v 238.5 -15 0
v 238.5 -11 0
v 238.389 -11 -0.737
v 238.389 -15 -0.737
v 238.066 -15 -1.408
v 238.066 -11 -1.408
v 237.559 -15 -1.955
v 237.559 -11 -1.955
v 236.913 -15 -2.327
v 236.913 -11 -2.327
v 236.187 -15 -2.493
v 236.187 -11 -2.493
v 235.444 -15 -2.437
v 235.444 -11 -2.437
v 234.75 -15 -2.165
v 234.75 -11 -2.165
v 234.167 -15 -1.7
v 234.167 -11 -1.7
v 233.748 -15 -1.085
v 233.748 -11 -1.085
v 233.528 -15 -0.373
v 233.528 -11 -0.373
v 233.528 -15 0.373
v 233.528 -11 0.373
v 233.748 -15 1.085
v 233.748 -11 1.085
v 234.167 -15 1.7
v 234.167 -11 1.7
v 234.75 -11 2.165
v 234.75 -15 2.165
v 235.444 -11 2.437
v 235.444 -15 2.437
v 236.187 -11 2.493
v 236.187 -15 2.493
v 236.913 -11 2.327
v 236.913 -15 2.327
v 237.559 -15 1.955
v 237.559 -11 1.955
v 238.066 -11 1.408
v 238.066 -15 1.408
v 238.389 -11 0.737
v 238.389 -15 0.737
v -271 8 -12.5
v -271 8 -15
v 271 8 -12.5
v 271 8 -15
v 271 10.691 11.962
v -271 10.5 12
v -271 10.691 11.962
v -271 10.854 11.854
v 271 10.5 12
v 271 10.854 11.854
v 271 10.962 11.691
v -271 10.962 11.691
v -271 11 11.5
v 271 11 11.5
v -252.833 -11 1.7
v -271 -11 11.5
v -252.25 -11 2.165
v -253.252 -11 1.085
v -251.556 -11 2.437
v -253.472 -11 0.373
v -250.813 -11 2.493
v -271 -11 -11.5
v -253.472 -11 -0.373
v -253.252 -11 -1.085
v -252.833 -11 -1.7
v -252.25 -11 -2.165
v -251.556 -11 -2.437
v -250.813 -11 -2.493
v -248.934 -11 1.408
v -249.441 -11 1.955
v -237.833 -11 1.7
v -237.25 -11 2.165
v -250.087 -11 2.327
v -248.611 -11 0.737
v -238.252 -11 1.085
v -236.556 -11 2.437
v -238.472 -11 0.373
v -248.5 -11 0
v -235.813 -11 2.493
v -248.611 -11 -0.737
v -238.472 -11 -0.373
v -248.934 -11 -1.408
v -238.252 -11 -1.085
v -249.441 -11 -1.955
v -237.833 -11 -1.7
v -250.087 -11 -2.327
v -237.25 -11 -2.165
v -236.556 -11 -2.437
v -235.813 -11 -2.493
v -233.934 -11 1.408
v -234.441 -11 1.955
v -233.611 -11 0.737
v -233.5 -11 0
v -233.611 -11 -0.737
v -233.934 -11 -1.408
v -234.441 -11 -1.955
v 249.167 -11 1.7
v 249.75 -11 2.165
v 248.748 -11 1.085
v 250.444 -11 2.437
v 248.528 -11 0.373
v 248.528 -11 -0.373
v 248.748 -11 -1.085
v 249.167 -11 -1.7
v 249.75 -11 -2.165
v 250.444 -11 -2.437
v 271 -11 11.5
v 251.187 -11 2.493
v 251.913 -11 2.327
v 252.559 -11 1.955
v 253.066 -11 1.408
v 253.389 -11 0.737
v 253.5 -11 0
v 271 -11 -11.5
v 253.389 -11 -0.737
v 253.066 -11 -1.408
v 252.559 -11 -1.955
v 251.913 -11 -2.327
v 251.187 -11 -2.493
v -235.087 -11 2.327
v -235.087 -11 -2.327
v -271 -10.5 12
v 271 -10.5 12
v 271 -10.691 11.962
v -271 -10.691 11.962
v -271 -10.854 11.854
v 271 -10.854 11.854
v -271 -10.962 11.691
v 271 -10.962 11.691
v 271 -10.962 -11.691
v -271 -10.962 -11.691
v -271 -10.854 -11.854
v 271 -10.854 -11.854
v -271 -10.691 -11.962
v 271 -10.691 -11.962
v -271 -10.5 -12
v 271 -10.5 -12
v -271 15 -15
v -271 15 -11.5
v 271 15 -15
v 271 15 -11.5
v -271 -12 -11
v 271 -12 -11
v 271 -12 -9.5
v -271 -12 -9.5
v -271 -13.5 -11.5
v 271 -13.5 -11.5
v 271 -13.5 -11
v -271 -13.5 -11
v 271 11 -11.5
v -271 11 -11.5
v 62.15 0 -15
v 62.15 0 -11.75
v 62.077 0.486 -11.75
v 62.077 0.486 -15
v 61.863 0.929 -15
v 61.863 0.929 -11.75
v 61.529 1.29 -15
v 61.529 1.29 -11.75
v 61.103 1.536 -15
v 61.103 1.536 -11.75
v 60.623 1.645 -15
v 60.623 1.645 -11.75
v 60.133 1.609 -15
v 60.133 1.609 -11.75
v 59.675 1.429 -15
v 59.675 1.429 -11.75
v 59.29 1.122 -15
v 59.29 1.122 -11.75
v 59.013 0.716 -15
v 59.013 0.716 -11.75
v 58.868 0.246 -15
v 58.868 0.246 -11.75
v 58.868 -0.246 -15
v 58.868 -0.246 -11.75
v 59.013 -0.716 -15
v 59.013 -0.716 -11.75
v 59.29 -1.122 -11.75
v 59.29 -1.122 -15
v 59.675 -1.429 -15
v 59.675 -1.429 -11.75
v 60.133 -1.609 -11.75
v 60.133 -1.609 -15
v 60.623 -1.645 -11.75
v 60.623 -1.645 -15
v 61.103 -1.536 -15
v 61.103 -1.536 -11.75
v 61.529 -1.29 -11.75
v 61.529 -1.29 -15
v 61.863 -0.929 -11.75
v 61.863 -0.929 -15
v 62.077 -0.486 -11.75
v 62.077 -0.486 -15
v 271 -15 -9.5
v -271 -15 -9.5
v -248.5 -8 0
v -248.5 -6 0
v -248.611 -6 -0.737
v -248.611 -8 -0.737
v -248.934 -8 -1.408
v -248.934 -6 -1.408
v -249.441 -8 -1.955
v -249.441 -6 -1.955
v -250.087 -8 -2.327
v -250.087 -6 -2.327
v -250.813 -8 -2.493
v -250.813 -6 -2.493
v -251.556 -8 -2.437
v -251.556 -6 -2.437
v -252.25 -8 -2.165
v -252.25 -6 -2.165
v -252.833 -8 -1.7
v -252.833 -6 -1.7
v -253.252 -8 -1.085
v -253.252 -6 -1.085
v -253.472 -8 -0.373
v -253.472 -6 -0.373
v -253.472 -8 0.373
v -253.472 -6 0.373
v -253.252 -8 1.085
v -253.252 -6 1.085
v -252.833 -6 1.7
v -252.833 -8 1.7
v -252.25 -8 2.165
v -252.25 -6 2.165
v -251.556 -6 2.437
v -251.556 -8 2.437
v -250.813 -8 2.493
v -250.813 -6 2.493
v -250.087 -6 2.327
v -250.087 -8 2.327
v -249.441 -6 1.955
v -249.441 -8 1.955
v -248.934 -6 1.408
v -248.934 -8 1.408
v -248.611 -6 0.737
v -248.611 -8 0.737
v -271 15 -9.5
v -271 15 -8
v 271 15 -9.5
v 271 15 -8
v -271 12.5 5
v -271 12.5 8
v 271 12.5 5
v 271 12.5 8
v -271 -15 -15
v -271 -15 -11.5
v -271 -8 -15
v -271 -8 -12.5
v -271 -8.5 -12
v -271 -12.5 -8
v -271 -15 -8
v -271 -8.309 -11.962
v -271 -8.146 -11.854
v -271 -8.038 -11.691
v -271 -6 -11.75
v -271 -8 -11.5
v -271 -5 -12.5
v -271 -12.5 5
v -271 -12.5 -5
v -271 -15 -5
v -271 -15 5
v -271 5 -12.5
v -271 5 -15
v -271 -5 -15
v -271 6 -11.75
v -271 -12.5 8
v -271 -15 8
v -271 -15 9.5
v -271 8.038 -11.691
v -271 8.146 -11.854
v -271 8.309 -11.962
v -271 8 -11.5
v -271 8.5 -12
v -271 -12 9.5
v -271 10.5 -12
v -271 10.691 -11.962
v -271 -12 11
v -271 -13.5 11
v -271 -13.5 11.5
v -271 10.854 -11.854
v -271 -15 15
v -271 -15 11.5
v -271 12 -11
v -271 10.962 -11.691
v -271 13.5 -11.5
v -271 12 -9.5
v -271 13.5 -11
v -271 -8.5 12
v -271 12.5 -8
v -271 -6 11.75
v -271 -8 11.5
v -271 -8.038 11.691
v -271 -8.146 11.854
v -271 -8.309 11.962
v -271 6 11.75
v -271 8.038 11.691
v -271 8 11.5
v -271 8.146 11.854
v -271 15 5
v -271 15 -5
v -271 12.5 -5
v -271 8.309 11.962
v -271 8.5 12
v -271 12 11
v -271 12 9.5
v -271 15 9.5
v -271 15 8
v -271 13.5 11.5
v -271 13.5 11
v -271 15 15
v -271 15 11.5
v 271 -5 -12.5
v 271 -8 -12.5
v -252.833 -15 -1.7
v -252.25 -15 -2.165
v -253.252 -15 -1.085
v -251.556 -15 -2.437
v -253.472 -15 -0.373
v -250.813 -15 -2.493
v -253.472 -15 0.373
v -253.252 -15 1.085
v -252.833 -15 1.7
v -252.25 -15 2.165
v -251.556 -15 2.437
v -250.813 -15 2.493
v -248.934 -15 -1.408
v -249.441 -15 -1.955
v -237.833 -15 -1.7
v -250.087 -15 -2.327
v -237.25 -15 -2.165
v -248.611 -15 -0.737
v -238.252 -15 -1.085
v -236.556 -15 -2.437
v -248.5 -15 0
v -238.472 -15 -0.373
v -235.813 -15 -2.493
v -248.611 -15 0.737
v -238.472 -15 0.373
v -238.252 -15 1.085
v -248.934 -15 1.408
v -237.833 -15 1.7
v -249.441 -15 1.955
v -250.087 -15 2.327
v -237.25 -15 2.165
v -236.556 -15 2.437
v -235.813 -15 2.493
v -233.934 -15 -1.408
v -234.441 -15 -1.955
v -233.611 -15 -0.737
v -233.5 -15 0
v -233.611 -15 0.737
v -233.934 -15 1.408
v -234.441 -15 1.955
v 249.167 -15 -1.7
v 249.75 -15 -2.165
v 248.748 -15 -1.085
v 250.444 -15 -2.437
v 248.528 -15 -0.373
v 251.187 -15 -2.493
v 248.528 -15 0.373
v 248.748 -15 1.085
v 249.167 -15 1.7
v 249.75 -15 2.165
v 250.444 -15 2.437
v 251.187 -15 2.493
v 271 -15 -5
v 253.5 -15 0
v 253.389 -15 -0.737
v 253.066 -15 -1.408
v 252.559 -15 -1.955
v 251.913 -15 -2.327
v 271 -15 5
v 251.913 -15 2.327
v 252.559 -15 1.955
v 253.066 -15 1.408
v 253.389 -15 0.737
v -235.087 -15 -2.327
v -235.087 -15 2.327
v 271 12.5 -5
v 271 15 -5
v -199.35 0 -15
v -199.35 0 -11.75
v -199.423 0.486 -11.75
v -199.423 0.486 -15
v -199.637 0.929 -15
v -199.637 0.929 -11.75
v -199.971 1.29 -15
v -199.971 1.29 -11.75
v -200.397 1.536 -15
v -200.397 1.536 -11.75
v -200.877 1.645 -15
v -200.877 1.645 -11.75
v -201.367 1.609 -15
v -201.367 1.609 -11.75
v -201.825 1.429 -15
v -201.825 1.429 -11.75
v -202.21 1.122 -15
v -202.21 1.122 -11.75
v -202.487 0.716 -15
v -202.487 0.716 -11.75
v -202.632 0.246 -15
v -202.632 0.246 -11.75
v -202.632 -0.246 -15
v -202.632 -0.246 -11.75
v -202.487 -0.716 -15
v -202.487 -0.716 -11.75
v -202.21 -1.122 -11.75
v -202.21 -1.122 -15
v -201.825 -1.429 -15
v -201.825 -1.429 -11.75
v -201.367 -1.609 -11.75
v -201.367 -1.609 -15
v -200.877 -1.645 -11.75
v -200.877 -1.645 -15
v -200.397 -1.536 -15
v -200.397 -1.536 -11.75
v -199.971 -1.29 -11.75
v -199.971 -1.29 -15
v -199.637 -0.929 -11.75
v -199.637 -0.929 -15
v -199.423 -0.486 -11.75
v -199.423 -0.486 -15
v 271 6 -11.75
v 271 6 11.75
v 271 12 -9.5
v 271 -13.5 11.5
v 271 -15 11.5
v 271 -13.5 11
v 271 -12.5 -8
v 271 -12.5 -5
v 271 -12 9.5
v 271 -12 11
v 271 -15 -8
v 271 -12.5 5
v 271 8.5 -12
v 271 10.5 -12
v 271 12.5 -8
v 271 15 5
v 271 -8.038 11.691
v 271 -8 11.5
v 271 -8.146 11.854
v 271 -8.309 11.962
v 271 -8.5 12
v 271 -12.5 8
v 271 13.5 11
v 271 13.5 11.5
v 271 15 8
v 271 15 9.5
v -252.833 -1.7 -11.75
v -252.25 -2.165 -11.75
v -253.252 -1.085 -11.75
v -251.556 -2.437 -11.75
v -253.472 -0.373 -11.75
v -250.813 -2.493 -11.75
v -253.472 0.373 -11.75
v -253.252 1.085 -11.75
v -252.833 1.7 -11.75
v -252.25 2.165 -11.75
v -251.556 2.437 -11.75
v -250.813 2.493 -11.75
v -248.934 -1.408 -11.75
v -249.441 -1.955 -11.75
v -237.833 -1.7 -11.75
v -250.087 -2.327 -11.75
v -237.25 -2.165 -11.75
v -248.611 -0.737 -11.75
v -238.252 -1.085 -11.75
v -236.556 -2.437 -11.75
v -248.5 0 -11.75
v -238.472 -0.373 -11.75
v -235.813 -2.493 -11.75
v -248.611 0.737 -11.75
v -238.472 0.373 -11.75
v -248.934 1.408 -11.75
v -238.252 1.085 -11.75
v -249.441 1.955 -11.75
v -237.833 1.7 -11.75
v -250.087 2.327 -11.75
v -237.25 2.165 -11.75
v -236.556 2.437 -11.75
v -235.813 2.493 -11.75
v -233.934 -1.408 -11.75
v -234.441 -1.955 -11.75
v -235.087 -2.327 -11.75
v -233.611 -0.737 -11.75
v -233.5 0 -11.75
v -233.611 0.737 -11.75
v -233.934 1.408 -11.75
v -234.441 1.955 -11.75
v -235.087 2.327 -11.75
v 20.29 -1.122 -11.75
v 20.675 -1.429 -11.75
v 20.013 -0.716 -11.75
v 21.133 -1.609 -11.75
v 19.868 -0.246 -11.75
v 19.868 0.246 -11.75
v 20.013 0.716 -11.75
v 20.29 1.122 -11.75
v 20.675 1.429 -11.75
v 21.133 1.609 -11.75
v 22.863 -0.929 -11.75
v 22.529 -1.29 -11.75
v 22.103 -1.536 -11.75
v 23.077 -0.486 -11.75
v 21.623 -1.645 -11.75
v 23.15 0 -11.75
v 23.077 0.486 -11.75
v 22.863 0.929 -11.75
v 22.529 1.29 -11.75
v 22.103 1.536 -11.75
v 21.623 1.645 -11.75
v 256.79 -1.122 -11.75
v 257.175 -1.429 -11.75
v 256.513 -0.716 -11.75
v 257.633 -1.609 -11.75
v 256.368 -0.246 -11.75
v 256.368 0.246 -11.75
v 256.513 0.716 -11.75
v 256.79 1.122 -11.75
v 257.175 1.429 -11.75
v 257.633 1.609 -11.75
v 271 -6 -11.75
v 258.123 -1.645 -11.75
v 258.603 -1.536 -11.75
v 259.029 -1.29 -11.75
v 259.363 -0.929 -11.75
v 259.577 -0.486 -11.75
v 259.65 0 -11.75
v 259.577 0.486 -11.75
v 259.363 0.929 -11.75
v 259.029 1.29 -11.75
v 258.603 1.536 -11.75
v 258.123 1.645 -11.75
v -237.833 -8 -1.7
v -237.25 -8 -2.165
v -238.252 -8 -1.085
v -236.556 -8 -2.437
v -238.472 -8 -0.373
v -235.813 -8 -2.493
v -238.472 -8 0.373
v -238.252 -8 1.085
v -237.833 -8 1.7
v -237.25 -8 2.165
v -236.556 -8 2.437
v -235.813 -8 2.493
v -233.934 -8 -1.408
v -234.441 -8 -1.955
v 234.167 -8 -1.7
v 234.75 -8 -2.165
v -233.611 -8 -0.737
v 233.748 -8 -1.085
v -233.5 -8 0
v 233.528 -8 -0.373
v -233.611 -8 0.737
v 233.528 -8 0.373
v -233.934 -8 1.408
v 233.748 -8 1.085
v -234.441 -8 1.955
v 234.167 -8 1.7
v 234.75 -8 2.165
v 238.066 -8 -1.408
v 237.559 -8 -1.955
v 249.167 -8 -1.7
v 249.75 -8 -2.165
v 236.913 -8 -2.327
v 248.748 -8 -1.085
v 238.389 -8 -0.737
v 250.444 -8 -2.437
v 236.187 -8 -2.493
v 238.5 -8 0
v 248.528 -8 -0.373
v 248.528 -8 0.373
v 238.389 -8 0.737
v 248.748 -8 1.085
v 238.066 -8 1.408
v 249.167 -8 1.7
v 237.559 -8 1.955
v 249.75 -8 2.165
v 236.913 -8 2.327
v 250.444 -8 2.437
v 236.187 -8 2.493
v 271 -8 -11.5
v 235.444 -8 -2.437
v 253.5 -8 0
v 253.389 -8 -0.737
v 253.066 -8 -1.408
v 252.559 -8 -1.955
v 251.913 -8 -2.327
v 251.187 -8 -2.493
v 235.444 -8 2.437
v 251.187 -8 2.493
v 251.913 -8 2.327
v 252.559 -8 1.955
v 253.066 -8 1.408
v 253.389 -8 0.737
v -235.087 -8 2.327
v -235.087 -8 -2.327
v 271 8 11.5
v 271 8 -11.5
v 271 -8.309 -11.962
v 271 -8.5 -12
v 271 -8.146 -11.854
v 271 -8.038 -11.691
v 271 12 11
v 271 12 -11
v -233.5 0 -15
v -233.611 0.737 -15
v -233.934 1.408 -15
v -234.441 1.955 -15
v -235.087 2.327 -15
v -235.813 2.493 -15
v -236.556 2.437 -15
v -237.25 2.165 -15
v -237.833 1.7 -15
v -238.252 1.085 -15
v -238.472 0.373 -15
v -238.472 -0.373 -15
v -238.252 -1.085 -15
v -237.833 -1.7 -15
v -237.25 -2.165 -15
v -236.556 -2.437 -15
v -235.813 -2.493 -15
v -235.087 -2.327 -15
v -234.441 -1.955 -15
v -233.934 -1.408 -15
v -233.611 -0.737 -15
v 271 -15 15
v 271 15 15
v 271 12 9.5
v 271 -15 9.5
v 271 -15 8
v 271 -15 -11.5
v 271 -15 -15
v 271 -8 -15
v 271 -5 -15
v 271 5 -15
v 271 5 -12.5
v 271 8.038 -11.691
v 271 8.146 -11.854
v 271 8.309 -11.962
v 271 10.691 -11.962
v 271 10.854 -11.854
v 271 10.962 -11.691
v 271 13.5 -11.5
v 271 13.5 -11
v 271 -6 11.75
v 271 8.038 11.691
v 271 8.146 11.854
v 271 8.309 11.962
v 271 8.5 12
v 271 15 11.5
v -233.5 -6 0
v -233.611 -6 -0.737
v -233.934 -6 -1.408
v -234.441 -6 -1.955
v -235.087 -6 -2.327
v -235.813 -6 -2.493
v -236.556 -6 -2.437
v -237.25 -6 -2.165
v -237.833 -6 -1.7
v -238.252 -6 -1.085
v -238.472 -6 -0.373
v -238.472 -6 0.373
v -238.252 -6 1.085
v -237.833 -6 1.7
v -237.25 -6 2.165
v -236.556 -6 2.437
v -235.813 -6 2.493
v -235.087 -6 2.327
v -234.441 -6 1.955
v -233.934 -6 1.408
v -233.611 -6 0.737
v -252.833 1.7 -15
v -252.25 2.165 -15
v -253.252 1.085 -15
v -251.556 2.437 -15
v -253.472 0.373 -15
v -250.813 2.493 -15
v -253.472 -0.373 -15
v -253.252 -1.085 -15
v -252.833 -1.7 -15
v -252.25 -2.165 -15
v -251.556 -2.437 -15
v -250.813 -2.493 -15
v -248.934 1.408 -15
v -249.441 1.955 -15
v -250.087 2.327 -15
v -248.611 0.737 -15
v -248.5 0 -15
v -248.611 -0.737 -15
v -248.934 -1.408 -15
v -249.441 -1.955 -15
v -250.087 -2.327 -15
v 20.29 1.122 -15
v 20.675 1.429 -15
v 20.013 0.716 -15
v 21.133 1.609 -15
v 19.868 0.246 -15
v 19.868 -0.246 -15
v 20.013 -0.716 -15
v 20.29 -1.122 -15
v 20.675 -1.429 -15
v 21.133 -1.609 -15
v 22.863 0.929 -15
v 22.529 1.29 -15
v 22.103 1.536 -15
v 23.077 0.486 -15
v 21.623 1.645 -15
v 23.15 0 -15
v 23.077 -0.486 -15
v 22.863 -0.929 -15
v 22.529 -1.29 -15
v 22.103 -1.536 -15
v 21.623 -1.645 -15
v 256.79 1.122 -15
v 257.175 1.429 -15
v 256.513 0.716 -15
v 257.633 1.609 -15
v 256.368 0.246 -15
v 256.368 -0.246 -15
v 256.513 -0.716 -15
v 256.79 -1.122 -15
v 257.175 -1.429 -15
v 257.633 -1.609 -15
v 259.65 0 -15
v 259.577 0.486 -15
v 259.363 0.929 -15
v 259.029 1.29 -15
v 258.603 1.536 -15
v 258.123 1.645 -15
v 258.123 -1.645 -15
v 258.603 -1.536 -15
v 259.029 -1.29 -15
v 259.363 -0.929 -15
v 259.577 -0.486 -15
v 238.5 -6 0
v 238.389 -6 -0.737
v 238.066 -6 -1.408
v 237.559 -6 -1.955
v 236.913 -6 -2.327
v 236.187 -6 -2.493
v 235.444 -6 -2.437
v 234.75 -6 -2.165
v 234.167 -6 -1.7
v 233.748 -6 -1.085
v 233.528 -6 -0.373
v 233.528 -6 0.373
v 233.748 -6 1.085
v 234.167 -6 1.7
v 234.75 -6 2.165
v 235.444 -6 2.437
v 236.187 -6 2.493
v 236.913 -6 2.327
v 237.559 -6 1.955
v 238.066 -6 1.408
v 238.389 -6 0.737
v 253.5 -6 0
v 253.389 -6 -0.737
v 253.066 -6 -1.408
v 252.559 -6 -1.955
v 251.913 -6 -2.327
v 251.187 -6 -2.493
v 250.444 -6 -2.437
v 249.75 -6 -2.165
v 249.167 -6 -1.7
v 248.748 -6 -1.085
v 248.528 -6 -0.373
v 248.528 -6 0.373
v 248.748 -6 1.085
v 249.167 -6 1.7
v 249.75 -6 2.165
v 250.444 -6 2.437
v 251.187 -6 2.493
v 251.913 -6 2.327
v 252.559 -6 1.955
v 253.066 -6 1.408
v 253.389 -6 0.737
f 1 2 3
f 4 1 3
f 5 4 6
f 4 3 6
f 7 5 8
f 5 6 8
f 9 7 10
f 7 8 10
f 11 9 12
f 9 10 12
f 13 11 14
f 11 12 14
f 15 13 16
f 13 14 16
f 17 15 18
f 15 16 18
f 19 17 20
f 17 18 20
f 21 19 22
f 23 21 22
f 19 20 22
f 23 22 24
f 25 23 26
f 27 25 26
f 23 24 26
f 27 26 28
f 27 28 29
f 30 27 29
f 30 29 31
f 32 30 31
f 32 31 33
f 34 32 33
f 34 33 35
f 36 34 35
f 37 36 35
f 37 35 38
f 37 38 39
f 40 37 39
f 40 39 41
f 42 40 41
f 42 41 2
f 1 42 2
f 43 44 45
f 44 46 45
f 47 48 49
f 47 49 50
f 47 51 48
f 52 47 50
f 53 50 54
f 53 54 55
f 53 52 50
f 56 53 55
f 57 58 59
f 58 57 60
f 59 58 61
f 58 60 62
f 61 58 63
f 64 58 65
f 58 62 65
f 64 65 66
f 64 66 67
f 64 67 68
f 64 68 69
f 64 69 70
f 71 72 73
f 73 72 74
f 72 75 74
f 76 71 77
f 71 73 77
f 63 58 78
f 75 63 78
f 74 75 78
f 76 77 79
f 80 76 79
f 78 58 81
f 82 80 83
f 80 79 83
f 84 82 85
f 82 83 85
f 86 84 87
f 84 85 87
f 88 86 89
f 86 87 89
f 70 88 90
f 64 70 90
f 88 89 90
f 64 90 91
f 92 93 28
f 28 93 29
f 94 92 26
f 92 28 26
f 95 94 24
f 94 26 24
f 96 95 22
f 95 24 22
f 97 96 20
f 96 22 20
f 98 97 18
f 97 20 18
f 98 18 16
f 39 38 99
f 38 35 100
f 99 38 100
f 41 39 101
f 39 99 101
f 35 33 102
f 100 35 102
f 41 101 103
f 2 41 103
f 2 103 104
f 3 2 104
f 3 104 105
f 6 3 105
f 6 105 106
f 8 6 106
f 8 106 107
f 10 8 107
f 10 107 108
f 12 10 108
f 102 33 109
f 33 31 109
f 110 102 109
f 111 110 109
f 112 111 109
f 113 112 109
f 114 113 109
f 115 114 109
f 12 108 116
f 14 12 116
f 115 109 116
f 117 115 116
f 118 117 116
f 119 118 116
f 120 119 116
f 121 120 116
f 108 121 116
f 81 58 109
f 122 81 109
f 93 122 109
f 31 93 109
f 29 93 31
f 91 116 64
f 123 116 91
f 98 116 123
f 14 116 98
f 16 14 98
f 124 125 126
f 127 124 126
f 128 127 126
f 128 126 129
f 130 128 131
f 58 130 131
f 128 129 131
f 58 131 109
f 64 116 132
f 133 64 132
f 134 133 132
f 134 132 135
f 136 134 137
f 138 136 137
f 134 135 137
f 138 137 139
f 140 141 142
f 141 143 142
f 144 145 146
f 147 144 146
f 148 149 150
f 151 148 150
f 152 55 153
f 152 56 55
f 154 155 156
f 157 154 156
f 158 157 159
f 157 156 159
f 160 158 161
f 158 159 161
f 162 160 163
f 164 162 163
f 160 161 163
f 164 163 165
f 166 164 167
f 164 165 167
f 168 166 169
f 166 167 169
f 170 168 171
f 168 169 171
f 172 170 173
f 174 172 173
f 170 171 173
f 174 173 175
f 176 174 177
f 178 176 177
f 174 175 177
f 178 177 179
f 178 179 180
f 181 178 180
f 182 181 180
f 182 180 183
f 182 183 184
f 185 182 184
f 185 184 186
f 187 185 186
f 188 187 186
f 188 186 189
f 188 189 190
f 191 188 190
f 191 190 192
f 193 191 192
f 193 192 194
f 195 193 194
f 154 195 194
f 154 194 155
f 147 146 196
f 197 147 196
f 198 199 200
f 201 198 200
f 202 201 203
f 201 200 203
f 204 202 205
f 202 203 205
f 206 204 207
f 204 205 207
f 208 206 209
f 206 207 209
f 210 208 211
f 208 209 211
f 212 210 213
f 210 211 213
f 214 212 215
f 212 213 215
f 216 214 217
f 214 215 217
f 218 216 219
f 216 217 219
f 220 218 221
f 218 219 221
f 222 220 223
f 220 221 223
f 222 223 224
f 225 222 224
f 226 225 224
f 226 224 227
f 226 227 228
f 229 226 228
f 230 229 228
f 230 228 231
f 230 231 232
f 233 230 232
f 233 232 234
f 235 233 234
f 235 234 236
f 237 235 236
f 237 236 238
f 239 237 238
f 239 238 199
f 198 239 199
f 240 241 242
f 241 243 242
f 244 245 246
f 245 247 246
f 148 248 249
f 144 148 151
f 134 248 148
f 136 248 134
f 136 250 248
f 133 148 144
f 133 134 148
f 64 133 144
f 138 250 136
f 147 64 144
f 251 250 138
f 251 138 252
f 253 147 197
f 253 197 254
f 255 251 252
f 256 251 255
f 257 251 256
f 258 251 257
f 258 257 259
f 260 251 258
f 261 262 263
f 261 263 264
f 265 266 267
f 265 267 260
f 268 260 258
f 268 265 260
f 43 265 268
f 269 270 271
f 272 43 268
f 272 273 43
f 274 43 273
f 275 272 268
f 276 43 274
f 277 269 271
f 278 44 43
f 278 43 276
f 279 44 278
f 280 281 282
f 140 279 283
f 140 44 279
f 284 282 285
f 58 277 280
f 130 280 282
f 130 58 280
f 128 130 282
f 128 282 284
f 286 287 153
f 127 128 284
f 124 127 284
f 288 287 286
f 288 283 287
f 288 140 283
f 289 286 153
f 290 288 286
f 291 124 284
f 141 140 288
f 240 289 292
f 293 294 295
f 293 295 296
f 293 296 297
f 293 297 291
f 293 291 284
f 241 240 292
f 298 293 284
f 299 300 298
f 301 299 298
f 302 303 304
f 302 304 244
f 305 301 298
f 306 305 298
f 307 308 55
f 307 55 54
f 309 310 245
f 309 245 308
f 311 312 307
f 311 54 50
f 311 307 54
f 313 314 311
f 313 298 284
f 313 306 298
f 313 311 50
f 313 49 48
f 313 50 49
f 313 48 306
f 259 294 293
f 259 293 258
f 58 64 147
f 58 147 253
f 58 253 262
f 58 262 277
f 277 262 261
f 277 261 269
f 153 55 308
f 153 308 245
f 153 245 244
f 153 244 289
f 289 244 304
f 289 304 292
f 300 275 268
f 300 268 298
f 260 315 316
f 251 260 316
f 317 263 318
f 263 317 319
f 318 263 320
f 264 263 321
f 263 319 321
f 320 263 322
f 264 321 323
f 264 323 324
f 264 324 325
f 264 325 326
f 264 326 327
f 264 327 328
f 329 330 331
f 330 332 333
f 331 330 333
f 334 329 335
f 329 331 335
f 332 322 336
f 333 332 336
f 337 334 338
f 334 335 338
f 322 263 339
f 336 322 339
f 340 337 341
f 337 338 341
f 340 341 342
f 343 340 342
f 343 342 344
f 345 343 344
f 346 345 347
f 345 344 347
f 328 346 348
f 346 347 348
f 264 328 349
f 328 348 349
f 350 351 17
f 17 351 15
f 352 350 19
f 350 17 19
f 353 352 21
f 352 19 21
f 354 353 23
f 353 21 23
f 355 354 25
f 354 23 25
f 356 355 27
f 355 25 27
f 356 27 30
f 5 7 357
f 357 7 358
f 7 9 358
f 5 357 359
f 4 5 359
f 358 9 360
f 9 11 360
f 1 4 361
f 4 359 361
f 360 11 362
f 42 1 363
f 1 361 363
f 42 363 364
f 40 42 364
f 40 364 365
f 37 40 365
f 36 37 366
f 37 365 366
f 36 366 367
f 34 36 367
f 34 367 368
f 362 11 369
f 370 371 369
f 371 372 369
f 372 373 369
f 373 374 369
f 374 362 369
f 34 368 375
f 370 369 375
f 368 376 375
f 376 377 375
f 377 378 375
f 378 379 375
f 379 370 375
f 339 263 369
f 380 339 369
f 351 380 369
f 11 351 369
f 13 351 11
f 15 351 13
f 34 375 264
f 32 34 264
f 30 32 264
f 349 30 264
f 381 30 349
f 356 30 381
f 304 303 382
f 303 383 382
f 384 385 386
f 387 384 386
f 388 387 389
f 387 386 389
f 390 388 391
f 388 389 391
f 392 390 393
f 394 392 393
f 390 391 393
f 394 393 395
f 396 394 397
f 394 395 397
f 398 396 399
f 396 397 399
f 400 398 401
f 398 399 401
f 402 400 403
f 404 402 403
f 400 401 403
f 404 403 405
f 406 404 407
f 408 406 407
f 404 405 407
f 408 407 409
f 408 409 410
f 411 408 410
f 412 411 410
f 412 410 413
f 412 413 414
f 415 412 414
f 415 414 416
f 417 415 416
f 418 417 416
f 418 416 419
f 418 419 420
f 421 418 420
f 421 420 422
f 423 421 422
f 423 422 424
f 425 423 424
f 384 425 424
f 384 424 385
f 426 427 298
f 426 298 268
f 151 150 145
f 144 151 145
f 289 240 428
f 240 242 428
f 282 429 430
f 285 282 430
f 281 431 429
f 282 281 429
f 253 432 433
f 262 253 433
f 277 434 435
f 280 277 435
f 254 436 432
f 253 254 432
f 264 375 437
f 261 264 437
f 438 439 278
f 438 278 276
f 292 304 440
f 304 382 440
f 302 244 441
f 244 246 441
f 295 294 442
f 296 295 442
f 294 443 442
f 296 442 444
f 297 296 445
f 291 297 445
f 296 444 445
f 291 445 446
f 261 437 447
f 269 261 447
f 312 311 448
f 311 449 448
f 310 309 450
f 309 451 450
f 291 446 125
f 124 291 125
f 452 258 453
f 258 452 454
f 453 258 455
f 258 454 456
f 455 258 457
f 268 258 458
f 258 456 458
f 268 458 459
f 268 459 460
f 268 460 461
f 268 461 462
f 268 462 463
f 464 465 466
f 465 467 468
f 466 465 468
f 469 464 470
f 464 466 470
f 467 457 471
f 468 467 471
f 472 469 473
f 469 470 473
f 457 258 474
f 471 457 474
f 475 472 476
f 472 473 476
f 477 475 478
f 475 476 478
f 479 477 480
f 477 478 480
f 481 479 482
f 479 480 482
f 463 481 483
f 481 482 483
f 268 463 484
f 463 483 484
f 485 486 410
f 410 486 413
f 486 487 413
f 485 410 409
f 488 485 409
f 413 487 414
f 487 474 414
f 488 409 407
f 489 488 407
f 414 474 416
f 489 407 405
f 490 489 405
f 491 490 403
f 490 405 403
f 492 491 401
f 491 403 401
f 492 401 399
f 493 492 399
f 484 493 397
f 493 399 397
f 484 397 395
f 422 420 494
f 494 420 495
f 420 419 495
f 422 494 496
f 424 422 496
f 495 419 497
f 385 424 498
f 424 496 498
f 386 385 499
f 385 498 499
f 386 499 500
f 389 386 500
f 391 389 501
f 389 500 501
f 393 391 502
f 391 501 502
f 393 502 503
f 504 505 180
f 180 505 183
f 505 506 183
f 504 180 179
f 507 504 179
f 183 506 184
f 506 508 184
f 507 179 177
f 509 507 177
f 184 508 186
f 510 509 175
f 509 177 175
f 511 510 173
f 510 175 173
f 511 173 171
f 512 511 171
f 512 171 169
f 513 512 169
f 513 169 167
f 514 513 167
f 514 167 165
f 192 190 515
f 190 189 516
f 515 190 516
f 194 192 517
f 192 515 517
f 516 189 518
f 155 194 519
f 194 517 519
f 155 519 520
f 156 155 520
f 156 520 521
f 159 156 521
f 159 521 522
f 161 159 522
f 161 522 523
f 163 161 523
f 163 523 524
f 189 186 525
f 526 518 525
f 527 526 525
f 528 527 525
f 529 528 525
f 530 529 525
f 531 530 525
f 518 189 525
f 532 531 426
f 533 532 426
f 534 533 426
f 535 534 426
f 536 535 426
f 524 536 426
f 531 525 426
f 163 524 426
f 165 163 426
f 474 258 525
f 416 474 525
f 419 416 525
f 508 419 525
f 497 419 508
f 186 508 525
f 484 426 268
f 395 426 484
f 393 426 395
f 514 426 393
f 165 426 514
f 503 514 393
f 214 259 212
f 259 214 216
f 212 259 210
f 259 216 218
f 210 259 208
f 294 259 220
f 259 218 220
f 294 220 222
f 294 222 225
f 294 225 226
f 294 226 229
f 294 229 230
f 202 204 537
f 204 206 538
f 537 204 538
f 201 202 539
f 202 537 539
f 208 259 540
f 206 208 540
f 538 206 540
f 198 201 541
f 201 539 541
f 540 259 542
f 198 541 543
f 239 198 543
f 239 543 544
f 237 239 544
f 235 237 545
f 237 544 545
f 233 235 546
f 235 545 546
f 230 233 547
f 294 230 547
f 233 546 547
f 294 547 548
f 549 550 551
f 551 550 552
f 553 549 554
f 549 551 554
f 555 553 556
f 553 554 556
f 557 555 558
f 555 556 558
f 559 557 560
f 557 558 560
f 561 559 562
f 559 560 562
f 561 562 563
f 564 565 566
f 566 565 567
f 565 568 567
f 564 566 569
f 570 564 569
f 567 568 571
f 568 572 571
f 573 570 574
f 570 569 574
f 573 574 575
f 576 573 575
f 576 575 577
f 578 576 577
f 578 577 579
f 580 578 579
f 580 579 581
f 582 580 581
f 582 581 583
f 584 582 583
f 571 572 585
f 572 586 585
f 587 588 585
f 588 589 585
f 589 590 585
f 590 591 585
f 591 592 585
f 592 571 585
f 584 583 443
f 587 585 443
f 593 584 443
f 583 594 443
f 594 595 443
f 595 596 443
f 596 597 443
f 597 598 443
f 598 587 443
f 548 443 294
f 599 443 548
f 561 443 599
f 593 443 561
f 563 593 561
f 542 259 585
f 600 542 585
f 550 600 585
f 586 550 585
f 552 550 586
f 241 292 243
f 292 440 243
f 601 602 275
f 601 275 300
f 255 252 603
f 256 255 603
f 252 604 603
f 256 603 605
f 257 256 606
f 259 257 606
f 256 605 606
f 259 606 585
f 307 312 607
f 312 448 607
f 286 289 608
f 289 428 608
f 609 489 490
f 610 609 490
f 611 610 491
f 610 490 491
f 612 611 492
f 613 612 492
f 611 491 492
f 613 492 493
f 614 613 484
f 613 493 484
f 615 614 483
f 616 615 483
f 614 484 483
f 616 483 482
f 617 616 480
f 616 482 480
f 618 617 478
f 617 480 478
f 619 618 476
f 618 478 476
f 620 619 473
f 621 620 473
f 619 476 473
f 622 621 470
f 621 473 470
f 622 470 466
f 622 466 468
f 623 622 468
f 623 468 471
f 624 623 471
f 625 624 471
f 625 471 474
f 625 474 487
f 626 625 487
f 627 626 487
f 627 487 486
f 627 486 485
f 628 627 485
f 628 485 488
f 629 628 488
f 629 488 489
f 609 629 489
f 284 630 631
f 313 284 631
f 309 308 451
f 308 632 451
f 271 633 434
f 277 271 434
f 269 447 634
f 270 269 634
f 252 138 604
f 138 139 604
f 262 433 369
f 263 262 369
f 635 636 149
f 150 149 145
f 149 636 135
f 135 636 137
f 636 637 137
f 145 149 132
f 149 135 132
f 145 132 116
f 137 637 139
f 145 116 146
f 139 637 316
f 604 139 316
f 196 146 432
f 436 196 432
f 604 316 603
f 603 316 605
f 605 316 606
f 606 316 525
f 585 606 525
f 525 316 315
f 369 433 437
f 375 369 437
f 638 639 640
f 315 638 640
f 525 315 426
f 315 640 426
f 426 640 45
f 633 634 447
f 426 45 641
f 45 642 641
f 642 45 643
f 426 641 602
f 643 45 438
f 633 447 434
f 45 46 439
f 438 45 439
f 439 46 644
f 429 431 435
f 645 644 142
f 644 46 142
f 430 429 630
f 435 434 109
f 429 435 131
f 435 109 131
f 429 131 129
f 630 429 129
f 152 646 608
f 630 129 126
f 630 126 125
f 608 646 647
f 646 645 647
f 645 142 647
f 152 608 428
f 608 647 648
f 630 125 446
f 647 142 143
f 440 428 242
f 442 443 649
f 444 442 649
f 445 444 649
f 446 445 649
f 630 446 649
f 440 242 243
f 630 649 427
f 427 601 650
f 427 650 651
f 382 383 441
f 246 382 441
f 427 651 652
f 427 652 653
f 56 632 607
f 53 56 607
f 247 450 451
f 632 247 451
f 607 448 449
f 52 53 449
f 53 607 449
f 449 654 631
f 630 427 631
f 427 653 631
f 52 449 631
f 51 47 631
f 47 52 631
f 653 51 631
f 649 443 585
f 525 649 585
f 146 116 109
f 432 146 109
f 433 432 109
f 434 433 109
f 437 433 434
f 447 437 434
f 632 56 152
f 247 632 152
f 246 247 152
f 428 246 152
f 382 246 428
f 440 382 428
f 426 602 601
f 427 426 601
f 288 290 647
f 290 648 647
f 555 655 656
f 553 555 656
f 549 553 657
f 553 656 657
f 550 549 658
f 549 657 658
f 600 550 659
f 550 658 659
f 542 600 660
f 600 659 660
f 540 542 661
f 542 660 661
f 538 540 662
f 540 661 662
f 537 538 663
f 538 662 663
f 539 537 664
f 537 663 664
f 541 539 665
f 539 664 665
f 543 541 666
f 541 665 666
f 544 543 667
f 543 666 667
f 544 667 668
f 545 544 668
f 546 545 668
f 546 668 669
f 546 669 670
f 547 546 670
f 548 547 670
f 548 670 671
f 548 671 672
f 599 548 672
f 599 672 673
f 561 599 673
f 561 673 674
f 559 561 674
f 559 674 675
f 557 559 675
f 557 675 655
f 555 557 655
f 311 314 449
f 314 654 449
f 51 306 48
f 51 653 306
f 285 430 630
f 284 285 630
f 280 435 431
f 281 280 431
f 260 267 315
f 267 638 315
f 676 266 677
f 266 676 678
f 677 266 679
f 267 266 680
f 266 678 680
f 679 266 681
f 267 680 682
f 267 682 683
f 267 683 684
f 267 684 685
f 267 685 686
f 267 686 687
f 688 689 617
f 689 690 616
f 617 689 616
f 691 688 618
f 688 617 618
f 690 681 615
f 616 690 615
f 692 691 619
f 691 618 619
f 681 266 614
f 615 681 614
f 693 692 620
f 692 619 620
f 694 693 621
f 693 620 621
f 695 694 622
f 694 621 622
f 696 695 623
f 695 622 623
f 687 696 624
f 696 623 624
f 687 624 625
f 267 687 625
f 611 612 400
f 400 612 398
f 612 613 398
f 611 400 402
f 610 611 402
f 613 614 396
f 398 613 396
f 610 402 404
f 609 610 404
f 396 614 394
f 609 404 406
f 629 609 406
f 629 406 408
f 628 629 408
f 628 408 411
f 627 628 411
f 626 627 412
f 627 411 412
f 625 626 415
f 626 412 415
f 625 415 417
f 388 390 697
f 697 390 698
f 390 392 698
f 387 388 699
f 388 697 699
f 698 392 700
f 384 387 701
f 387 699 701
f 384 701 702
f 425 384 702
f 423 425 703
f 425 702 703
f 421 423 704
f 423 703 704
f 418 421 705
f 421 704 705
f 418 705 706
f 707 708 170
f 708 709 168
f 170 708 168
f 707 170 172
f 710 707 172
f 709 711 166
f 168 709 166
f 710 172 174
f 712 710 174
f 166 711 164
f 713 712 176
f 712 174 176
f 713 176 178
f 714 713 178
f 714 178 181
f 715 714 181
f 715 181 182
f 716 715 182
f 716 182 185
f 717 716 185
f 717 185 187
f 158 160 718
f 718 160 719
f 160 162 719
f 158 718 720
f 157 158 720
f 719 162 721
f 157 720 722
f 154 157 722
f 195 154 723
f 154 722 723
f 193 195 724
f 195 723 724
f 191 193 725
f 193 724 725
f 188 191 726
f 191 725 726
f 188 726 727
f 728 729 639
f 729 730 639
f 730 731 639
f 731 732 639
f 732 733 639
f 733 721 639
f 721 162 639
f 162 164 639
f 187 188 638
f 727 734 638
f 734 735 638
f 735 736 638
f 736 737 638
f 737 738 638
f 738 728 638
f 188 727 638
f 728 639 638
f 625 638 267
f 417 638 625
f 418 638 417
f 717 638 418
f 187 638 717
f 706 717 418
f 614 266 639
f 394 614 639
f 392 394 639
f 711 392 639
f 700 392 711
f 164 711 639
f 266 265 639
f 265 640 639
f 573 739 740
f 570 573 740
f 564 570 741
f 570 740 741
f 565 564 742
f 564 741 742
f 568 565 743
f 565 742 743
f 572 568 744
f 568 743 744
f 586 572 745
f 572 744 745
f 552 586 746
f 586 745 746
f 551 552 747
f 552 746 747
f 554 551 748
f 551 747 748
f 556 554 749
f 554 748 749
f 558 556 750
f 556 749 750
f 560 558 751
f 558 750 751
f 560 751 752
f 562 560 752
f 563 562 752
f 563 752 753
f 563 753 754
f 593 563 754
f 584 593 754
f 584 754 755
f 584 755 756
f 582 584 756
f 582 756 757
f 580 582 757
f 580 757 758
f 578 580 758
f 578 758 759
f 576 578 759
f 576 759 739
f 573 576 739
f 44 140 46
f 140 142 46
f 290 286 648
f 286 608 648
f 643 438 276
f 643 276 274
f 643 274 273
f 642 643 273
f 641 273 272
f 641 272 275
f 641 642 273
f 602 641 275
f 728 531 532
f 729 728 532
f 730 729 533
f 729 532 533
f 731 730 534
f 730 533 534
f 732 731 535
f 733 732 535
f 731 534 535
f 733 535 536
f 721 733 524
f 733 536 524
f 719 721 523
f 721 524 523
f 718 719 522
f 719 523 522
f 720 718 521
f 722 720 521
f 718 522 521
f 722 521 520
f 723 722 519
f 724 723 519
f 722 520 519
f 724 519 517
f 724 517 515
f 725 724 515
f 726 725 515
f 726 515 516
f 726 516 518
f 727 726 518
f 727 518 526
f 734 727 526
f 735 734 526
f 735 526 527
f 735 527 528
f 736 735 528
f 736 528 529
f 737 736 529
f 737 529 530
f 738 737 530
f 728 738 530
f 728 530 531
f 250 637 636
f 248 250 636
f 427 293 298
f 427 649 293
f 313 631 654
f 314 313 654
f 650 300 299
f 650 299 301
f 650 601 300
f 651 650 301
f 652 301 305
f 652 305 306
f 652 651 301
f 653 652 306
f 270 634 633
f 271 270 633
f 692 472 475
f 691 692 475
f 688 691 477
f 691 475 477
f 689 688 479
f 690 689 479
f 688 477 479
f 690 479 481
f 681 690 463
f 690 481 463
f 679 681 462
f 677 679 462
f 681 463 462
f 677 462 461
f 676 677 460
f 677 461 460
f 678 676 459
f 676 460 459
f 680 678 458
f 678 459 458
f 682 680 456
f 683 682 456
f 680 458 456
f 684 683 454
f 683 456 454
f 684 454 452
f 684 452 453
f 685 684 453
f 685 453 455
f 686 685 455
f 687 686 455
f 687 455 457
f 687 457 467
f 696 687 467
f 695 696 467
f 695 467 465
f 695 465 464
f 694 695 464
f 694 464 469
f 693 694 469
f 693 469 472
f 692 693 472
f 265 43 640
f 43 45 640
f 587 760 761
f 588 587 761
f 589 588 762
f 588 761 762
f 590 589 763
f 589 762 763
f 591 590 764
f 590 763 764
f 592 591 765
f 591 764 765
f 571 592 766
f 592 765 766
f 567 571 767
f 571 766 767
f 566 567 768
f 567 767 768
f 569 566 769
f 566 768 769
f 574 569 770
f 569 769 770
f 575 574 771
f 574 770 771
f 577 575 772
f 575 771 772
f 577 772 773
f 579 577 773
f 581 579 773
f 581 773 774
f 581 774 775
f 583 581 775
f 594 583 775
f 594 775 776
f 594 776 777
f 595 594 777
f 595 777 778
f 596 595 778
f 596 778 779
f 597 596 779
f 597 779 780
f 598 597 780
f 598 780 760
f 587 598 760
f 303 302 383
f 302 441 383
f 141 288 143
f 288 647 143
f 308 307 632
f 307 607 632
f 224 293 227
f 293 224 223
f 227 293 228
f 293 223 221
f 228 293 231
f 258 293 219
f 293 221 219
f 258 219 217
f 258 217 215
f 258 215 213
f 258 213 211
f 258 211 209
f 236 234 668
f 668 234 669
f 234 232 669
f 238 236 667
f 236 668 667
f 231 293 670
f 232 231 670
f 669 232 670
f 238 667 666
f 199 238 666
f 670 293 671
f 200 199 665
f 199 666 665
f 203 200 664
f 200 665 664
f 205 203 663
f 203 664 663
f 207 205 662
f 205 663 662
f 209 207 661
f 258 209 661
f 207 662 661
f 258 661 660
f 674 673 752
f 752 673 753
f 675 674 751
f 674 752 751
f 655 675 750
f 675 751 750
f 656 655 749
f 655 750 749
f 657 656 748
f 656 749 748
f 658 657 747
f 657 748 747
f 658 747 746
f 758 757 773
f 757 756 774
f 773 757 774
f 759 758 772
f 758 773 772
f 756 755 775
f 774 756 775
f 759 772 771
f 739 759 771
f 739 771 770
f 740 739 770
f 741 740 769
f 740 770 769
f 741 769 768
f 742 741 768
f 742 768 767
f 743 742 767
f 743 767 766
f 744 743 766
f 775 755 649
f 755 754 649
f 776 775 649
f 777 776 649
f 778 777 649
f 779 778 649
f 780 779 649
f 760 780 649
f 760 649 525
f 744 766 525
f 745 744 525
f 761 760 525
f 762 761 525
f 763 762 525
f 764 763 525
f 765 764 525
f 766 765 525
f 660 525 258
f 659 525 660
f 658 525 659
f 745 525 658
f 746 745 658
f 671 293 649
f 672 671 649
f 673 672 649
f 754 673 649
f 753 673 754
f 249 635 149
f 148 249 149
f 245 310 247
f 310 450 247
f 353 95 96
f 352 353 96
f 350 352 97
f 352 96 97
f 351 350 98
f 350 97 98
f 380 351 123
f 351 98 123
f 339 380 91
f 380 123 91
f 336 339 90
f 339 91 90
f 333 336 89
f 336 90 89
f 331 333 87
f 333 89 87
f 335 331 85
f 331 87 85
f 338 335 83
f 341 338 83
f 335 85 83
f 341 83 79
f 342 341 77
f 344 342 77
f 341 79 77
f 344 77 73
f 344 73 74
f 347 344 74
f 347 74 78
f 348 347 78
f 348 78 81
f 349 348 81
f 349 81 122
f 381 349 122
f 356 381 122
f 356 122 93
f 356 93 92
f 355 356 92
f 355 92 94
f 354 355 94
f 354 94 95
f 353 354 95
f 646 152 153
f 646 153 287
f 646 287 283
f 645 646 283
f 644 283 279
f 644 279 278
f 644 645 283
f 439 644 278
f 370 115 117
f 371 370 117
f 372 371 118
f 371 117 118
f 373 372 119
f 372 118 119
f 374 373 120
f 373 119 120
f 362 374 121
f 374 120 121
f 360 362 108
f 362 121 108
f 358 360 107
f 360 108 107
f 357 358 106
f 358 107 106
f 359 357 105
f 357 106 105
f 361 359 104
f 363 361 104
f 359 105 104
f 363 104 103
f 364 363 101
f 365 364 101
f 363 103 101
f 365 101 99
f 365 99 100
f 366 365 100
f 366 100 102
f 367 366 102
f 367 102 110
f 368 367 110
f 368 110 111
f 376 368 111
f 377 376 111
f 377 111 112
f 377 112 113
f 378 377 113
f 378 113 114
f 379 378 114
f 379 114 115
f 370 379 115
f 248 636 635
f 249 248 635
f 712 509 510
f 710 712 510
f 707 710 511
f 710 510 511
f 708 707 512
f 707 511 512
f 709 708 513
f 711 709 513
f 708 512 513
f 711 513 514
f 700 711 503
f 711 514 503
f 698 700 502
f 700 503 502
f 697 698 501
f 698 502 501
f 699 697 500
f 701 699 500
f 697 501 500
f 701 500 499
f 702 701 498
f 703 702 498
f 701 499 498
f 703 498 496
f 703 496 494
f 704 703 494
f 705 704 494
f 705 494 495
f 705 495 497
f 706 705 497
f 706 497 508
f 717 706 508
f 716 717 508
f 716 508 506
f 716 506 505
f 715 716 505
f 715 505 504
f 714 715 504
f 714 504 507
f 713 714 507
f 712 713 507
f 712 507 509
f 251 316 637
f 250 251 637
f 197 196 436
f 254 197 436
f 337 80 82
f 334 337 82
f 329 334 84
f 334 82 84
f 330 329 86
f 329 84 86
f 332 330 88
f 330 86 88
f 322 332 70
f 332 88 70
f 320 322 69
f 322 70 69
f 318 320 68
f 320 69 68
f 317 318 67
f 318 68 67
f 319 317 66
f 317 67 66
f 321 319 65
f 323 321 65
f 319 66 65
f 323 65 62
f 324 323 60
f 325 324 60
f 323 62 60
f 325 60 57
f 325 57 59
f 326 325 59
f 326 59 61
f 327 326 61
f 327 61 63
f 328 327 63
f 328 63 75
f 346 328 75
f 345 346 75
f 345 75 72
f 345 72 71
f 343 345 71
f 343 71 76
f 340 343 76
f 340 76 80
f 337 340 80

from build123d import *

# Parameters (mm, degrees)
SKETCH_1_W             = 23.5
SKETCH_1_H             = 12
EXTRUDE_1_DEPTH        = 271
HOLE_WIZARD_M6_1_D     = 5
HOLE_WIZARD_M6_1_DEPTH = 19
HOLE_WIZARD_M6_1_TIP   = 1.502151548
HOLE_WIZARD_M6_2_D     = 5
HOLE_WIZARD_M6_2_DEPTH = 19
HOLE_WIZARD_M6_2_TIP   = 1.502151548
HOLE_WIZARD_M4_1_D     = 3.3
HOLE_WIZARD_M4_1_DEPTH = 11.5
HOLE_WIZARD_M4_1_TIP   = 0.991420021


with BuildPart() as part:
    # 草图1 → 凸台-拉伸1 (new, symmetric)
    with BuildSketch(Plane(origin=(0, 0, 0), x_dir=(0, 0, -1), z_dir=(1, 0, 0))):
        Polygon((-15, 15), (-11.5, 15), (-11.5, 13.5), (-11, 13.5), (-11, 12), (-9.5, 12), (-9.5, 15), (-8, 15), (-8, 12.5), (-5, 12.5), (-5, 15), (5, 15), (5, 12.5), (8, 12.5), (8, 15), (9.5, 15), (9.5, 12), (11, 12), (11, 13.5), (11.5, 13.5), (11.5, 15), (15, 15), (15, 8), (12.5, 8), (12.5, 5), (15, 5), (15, -5), (12.5, -5), (12.5, -8), (15, -8), (15, -15), (11.5, -15), (11.5, -13.5), (11, -13.5), (11, -12), (9.5, -12), (9.5, -15), (8, -15), (8, -12.5), (5, -12.5), (5, -15), (-5, -15), (-5, -12.5), (-8, -12.5), (-8, -15), (-9.5, -15), (-9.5, -12), (-11, -12), (-11, -13.5), (-11.5, -13.5), (-11.5, -15), (-15, -15), align=None)
        with BuildLine():
            Line((12, -10.5), (12, -8.5))
            ThreePointArc((12, -8.5), (11.853553391, -8.146446609), (11.5, -8))
            Line((11.5, -8), (-11.5, -8))
            ThreePointArc((-11.5, -8), (-11.853553391, -8.146446609), (-12, -8.5))
            Line((-12, -8.5), (-12, -10.5))
            ThreePointArc((-12, -10.5), (-11.853553391, -10.853553391), (-11.5, -11))
            Line((-11.5, -11), (11.5, -11))
            ThreePointArc((11.5, -11), (11.853553391, -10.853553391), (12, -10.5))
        make_face(mode=Mode.SUBTRACT)
        with BuildLine():
            Line((-11.5, 11), (11.5, 11))
            ThreePointArc((11.5, 11), (11.853553391, 10.853553391), (12, 10.5))
            Line((12, 10.5), (12, 8.5))
            ThreePointArc((12, 8.5), (11.853553391, 8.146446609), (11.5, 8))
            Line((11.5, 8), (-11.5, 8))
            ThreePointArc((-11.5, 8), (-11.853553391, 8.146446609), (-12, 8.5))
            Line((-12, 8.5), (-12, 10.5))
            ThreePointArc((-12, 10.5), (-11.853553391, 10.853553391), (-11.5, 11))
        make_face(mode=Mode.SUBTRACT)
        Rectangle(SKETCH_1_W, SKETCH_1_H, mode=Mode.SUBTRACT)
    extrude(amount=EXTRUDE_1_DEPTH, both=True)

    # M6 螺纹孔1
    with Locations(Plane(origin=(0, -15, 0), x_dir=(-1, 0, 0), z_dir=(0, -1, 0))):
        with Locations((-236, 0), (-251, 0), (251, 0), (236, 0)):
            Hole(HOLE_WIZARD_M6_1_D / 2, depth=HOLE_WIZARD_M6_1_DEPTH)
            with Locations((0, 0, -(HOLE_WIZARD_M6_1_DEPTH + HOLE_WIZARD_M6_1_TIP / 2))):  # 118° drill point
                Cone(0, HOLE_WIZARD_M6_1_D / 2, HOLE_WIZARD_M6_1_TIP, mode=Mode.SUBTRACT)

    # M6 螺纹孔2
    with Locations(Plane(origin=(0, 0, -15), x_dir=(-1, 0, 0), z_dir=(0, 0, -1))):
        with Locations((236, 0), (251, 0)):
            Hole(HOLE_WIZARD_M6_2_D / 2, depth=HOLE_WIZARD_M6_2_DEPTH)
            with Locations((0, 0, -(HOLE_WIZARD_M6_2_DEPTH + HOLE_WIZARD_M6_2_TIP / 2))):  # 118° drill point
                Cone(0, HOLE_WIZARD_M6_2_D / 2, HOLE_WIZARD_M6_2_TIP, mode=Mode.SUBTRACT)

    # M4 螺纹孔1
    with Locations(Plane(origin=(0, 0, -15), x_dir=(-1, 0, 0), z_dir=(0, 0, -1))):
        with Locations((-258, 0), (-60.5, 0), (-21.500000001, 0), (200.999999999, 0)):
            Hole(HOLE_WIZARD_M4_1_D / 2, depth=HOLE_WIZARD_M4_1_DEPTH)
            with Locations((0, 0, -(HOLE_WIZARD_M4_1_DEPTH + HOLE_WIZARD_M4_1_TIP / 2))):  # 118° drill point
                Cone(0, HOLE_WIZARD_M4_1_D / 2, HOLE_WIZARD_M4_1_TIP, mode=Mode.SUBTRACT)


solid = part.part
